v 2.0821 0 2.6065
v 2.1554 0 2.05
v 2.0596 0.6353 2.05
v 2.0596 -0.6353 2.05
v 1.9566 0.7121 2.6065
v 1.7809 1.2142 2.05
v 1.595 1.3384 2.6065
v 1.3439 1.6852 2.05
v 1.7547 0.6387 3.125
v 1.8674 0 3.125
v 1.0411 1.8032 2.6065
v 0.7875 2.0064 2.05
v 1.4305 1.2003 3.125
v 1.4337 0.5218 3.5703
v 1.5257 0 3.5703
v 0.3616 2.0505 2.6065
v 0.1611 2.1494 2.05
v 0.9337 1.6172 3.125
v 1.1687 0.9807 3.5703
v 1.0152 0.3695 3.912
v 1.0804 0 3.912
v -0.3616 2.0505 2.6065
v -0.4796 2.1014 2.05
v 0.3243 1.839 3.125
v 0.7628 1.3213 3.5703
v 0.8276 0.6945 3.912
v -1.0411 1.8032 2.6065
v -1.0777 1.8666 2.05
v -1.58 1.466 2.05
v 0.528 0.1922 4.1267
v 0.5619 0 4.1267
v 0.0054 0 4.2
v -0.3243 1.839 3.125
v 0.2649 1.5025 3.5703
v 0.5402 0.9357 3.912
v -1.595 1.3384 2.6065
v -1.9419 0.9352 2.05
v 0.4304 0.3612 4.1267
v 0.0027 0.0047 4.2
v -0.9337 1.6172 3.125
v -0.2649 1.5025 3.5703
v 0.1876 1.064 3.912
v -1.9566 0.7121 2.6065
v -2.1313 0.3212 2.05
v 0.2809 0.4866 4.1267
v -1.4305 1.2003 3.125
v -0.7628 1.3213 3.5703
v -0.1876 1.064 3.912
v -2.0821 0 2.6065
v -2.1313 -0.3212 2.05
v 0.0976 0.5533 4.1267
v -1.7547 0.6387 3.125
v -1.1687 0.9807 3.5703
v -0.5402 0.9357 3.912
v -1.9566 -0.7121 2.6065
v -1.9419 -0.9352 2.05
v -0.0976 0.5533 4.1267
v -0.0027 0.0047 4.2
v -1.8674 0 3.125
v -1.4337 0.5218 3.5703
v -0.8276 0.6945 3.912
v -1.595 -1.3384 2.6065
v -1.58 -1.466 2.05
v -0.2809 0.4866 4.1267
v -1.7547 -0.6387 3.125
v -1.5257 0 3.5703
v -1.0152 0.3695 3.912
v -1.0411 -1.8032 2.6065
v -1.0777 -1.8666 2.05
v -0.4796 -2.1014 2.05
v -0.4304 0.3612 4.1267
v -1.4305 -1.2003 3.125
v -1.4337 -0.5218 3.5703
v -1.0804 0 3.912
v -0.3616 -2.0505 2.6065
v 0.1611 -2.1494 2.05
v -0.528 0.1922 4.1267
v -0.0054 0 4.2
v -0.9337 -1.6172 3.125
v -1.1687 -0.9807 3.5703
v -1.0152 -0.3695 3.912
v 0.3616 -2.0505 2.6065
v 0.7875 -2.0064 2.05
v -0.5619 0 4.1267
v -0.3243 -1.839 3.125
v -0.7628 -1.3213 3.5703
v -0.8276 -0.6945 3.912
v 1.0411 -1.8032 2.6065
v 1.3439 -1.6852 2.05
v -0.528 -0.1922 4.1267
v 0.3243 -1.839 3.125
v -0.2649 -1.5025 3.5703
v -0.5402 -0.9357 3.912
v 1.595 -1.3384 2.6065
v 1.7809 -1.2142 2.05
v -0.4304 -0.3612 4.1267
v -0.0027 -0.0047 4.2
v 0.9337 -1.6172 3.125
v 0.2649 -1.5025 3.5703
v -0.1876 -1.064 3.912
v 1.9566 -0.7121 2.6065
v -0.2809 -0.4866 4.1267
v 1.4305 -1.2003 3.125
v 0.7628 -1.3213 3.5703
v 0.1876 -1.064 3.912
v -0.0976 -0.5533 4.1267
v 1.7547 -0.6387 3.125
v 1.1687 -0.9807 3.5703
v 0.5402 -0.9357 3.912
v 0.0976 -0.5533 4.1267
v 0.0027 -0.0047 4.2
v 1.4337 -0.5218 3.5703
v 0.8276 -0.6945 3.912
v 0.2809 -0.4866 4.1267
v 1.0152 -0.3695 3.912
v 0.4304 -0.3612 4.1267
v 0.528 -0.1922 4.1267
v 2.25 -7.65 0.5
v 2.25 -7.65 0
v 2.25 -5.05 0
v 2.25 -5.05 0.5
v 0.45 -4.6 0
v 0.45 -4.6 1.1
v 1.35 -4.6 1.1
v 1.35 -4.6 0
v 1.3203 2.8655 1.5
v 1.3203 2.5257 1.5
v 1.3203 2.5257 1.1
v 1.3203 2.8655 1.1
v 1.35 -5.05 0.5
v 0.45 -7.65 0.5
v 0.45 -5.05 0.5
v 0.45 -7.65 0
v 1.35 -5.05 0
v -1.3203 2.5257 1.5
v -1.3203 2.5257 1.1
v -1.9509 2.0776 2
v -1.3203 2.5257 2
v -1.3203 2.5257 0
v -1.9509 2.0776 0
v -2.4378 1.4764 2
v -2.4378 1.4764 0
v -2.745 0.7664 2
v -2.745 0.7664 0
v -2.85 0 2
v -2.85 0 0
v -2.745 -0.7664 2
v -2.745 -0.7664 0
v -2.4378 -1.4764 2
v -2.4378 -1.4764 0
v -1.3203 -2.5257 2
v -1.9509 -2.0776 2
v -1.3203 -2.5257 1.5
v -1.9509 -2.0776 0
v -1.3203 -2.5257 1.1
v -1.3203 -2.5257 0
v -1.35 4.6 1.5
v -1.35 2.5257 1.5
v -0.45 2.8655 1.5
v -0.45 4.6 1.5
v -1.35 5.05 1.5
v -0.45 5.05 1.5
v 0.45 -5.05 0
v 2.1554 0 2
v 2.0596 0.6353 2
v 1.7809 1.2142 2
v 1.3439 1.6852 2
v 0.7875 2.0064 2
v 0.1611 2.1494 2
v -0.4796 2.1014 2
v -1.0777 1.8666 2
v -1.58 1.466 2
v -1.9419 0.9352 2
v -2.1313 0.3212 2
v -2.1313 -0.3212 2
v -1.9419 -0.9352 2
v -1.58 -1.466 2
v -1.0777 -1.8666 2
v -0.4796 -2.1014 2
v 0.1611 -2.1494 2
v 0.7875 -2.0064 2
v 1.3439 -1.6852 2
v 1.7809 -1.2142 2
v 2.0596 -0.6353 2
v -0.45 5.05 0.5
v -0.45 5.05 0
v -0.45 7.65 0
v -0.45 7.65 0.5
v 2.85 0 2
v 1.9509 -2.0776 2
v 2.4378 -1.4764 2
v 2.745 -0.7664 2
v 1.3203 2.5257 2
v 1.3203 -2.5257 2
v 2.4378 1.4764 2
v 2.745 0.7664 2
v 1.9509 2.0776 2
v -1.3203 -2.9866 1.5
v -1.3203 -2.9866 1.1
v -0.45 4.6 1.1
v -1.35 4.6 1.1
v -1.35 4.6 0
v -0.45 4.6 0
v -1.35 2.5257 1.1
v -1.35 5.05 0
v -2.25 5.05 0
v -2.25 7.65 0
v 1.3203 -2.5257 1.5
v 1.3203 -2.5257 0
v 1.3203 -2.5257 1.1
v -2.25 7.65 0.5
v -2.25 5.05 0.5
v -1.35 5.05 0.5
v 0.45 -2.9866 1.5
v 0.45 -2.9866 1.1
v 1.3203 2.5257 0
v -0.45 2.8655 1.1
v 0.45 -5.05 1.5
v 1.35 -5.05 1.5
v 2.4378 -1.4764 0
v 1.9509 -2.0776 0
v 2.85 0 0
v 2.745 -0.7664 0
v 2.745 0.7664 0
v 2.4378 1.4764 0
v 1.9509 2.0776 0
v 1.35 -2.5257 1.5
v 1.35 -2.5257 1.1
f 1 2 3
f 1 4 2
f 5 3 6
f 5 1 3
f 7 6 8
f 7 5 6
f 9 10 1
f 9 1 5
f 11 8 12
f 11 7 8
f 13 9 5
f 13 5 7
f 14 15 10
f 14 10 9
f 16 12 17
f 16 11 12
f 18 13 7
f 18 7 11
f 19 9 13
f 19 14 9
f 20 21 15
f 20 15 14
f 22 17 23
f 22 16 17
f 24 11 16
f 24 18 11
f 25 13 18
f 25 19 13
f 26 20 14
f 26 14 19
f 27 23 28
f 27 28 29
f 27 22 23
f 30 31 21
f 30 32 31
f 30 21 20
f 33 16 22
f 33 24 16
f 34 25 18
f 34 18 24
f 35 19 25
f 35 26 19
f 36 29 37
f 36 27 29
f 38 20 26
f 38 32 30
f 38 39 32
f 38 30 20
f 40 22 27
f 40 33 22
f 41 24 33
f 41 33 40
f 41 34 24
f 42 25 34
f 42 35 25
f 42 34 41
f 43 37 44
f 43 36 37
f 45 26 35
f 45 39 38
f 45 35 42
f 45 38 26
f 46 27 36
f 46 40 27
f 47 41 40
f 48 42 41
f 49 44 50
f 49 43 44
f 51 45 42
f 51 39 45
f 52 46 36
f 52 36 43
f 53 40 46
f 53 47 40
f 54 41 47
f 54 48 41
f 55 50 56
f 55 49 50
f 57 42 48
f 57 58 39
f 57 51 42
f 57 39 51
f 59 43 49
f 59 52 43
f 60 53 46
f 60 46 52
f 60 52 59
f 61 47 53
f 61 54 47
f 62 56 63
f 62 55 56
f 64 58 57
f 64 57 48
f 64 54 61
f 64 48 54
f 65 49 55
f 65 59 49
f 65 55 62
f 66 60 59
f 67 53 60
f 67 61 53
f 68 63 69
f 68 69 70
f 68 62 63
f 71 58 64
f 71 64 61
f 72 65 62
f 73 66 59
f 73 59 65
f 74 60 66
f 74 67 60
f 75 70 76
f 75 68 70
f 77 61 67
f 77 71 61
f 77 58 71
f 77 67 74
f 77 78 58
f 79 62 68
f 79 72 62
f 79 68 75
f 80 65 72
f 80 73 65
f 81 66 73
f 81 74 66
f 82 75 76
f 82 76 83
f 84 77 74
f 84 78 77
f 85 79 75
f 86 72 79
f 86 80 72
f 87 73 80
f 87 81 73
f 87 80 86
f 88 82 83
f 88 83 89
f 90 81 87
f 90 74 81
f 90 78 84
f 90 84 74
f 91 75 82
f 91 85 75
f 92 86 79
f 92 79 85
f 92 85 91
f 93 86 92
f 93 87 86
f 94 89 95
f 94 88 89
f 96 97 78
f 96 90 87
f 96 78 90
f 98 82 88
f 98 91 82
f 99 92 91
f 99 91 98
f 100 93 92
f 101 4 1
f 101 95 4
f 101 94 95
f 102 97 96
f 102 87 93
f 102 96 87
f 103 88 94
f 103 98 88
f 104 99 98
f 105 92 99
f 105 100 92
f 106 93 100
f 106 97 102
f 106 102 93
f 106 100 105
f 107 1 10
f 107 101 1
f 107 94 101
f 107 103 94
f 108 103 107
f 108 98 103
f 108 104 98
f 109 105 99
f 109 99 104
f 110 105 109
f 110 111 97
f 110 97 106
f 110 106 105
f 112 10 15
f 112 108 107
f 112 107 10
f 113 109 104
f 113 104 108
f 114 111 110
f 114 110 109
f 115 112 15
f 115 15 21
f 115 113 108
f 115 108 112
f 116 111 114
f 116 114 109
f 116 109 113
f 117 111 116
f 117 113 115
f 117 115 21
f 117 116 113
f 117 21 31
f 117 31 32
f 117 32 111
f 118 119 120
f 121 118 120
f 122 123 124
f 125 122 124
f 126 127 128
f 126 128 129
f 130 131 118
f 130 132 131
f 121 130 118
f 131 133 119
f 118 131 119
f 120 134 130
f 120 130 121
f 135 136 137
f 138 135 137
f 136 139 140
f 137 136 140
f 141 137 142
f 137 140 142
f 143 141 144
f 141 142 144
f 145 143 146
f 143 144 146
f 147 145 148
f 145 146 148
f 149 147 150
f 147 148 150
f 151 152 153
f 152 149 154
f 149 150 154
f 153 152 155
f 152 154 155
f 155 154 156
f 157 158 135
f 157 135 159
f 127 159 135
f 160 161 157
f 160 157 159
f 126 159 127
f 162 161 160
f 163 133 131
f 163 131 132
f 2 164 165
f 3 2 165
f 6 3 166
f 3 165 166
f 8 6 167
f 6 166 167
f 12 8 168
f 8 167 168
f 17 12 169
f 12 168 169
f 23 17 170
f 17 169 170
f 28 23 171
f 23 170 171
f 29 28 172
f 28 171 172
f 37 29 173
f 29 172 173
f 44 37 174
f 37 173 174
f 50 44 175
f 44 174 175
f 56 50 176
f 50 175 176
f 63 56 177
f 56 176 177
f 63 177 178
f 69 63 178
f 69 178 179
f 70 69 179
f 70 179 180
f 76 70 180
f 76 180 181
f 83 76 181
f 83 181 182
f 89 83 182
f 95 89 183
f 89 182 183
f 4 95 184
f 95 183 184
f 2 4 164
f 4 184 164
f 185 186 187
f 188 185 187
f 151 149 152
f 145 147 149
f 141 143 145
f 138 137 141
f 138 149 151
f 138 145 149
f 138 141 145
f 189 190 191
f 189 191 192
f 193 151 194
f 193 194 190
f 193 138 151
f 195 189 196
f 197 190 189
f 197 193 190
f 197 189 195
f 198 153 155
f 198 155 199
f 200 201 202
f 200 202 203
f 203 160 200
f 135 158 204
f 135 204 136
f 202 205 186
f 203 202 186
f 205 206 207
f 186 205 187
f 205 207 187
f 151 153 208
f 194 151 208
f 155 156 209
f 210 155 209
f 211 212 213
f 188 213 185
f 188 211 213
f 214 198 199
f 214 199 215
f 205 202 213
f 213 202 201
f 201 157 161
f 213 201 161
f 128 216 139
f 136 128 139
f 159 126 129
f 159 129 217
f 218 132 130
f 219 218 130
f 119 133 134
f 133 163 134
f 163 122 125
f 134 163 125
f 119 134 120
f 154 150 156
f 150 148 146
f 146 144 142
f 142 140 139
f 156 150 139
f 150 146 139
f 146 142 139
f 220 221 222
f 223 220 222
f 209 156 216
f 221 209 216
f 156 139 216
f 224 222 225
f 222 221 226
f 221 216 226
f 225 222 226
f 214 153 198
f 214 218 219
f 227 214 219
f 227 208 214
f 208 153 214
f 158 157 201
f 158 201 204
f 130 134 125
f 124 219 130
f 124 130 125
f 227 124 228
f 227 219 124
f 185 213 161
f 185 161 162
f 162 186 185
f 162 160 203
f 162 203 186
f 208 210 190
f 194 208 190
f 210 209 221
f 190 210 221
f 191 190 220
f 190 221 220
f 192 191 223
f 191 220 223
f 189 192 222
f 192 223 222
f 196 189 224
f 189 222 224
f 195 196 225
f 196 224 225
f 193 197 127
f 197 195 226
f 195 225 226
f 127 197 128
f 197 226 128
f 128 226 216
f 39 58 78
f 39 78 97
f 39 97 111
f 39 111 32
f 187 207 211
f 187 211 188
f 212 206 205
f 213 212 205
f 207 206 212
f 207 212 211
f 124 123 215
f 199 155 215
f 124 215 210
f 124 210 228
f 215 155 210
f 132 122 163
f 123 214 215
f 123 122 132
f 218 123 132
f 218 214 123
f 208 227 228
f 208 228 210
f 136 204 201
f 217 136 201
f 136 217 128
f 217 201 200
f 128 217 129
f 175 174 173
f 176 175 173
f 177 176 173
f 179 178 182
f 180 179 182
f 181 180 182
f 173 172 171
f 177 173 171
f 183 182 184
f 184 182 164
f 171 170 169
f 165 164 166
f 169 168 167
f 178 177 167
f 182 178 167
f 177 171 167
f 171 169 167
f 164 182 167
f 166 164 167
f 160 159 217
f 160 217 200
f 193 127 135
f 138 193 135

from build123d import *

# Parameters (mm, degrees)
F0_W          = 1.799994
F0_H          = 2.599999
F0_W_2        = 1.800001
F0_H_2        = 2.600001
F1_DEPTH      = 0.5
F2_DEPTH      = 2
F3_W          = 0.9
F3_H          = 0.45
F3_W_2        = 0.899997
F4_DEPTH      = 1
F4_DEPTH_BACK = 0.5
F6_DEPTH      = 0.4
F7_R          = 2.1554
F8_DEPTH      = 2.2
F9_R          = 2.15


with BuildPart() as f1:
    # F0 (on Top) → F1 (new body)
    with BuildSketch(Plane.XY):
        with Locations((-1.350008, 6.349999)):
            Rectangle(F0_W, F0_H)
        with Locations((1.349989, -6.349998)):
            Rectangle(F0_W_2, F0_H_2)
    extrude(amount=F1_DEPTH)

    # F3 (on face) → F4 (join, two sides)
    with BuildSketch(Plane.XY.offset(0.5)) as f4_sk:
        with Locations((0.899989, -4.824998)):
            Rectangle(F3_W, F3_H)
        with Locations((-0.900009, 4.825)):
            Rectangle(F3_W_2, F3_H)
    extrude(amount=F4_DEPTH)
    extrude(f4_sk.sketch, amount=-F4_DEPTH_BACK)



with BuildPart() as f2:
    # F0 (on Top) → F2 (new body)
    with BuildSketch(Plane.XY):
        with BuildLine():
            Line((1.320324, 2.525716), (-1.320324, 2.525716))
            ThreePointArc((-1.320324, 2.525716), (-2.85, 0), (-1.320324, -2.525716))
            Line((-1.320324, -2.525716), (1.320324, -2.525716))
            ThreePointArc((1.320324, -2.525716), (2.85, 0), (1.320324, 2.525716))
        make_face()
    extrude(amount=F2_DEPTH)


with BuildPart() as f1_1:
    add(f1.part)

    add(f2.part)  # F6 merges F2
    # F5 (on face) → F6 (join)
    with BuildSketch(Plane.XY.offset(1.5)):
        Polygon((0.449989, -4.599998), (1.349989, -4.599998), (1.349989, -2.525716), (0.449989, -2.525716), (-1.320324, -2.525716), (-1.320324, -2.986554), (0.449989, -2.986554), align=None)
        Polygon((-0.450011, 4.6), (-1.350008, 4.6), (-1.350008, 2.525716), (-0.450011, 2.525716), (1.320324, 2.525716), (1.320324, 2.865515), (-0.450011, 2.865515), align=None)
    extrude(amount=-F6_DEPTH)


with BuildPart() as f8:
    # F7 (on face) → F8 (new body)
    with BuildSketch(Plane.XY.offset(2)):
        Circle(F7_R)
    extrude(amount=F8_DEPTH)

    # F9
    f9_edges = [f8.edges().sort_by_distance(p)[0] for p in [
        (-2.1554, 0, 4.2),
    ]]
    fillet(f9_edges, radius=F9_R)


solid = Compound([f1_1.part, f8.part])
